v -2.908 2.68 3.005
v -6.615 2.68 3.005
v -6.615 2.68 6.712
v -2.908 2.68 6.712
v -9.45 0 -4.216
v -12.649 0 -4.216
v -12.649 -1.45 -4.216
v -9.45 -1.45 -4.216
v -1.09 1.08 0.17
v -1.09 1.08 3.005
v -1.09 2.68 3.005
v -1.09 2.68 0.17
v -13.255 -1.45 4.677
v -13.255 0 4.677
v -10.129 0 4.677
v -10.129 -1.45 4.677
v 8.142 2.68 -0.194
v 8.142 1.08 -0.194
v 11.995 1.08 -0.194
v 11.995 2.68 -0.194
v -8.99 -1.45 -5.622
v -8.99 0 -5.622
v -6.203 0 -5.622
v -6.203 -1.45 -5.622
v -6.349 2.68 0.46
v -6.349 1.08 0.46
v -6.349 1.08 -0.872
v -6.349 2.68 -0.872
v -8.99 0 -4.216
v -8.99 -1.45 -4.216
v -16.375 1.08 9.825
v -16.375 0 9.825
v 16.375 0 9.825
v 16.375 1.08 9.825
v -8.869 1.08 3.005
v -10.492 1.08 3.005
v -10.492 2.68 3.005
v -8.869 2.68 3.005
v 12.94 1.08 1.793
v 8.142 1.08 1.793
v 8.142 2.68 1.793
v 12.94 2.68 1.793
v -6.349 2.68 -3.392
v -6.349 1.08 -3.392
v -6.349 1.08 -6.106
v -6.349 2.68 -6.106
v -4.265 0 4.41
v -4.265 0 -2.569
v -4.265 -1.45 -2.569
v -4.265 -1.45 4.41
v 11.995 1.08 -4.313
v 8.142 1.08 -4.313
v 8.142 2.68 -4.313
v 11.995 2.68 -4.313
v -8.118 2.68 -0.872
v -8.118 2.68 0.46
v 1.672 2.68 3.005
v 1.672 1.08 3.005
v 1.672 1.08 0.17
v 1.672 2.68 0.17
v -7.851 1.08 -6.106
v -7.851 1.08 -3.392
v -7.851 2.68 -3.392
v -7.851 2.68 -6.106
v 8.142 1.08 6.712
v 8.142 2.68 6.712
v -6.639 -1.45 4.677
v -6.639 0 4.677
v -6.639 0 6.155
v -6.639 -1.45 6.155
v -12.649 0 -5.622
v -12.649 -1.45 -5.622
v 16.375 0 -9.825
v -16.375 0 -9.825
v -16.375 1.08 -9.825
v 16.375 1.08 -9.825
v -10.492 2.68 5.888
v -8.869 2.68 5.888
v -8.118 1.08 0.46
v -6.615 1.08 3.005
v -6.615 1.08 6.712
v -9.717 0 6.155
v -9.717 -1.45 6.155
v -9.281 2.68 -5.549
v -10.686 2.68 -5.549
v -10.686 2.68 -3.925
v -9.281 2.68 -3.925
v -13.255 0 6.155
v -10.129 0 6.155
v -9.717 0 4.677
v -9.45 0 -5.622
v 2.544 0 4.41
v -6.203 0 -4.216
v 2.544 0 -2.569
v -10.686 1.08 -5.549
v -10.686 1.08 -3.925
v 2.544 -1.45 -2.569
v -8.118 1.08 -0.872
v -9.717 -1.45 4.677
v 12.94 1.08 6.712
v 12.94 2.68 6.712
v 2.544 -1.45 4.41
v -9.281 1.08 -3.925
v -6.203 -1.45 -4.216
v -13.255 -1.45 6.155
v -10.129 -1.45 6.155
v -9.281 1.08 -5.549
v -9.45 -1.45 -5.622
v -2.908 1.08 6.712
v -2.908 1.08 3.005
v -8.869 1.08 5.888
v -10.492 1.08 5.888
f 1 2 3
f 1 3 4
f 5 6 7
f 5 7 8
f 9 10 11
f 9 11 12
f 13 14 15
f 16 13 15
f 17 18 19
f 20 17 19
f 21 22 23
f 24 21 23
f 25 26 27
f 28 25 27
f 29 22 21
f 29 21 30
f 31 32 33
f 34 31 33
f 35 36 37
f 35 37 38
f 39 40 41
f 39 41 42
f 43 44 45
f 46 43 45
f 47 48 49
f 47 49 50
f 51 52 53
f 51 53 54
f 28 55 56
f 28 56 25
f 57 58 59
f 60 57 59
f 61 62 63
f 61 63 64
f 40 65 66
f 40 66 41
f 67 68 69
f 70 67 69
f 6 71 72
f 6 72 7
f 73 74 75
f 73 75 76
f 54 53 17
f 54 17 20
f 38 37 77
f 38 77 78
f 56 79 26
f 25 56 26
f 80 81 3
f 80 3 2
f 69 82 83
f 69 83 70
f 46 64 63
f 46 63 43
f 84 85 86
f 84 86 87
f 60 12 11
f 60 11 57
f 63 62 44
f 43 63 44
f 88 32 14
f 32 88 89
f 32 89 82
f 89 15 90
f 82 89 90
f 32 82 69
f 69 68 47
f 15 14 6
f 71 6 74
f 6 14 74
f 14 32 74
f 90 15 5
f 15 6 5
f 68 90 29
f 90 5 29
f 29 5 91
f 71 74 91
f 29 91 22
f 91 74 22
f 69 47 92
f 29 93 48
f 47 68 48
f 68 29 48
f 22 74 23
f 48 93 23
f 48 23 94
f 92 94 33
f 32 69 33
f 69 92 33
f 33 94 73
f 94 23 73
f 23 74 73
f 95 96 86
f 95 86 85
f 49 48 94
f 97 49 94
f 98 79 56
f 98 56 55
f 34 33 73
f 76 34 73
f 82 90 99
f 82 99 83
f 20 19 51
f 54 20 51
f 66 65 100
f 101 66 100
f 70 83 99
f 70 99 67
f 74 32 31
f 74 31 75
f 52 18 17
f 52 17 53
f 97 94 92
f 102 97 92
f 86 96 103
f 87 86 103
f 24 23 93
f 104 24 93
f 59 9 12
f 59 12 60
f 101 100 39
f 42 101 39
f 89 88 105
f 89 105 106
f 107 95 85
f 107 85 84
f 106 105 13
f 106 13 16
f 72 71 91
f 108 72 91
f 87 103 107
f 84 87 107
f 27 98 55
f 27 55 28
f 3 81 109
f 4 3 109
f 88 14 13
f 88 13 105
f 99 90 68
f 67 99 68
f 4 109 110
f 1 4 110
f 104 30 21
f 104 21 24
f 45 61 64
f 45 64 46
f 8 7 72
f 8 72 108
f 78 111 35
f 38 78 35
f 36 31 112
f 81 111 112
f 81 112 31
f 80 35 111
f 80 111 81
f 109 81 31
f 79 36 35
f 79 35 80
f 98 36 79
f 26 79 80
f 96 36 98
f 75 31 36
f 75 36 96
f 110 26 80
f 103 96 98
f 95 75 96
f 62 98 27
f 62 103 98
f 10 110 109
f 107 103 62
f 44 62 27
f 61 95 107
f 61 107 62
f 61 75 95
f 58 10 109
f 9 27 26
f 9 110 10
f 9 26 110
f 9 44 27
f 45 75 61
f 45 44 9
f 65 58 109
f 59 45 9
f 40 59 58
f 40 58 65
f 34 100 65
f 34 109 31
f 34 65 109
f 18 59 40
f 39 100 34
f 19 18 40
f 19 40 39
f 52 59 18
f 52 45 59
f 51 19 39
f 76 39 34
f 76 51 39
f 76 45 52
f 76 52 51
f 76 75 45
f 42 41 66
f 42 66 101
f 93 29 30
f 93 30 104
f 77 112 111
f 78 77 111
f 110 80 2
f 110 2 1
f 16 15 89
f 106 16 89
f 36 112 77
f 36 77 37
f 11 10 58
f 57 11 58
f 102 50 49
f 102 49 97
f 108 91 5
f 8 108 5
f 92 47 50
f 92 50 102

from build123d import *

# Parameters (mm, degrees)
SKETCH1_W           = 32.75
SKETCH1_H           = 19.65
BOSS_EXTRUDE1_DEPTH = 1.08
SKETCH2_W           = 1.405419427
SKETCH2_H           = 1.623501752
SKETCH2_W_2         = 1.502344905
SKETCH2_H_2         = 2.713913376
SKETCH2_W_3         = 1.623501751
SKETCH2_H_3         = 2.883532962
SKETCH2_W_4         = 3.707399523
SKETCH2_H_4         = 3.707399523
SKETCH2_W_5         = 2.762376115
SKETCH2_H_5         = 2.835070223
SKETCH2_W_6         = 4.797811147
SKETCH2_H_6         = 4.918967994
SKETCH2_W_7         = 3.852787739
SKETCH2_H_7         = 4.119332803
SKETCH2_W_8         = 1.768889968
SKETCH2_H_8         = 1.332725318
BOSS_EXTRUDE2_DEPTH = 1.6
SKETCH3_W           = 6.809014809
SKETCH3_H           = 6.978634395
SKETCH3_W_2         = 3.198540765
SKETCH3_H_2         = 1.405419426
SKETCH3_W_3         = 2.786607484
SKETCH3_W_4         = 3.077383918
SKETCH3_H_3         = 1.478113535
SKETCH3_W_5         = 3.125846656
BOSS_EXTRUDE3_DEPTH = 1.45


with BuildPart() as part:
    # Sketch1 → Boss-Extrude1 (new body)
    with BuildSketch(Plane(origin=(0, 0, 0), x_dir=(1, 0, 0), z_dir=(0, 1, 0))):
        Rectangle(SKETCH1_W, SKETCH1_H)
    extrude(amount=BOSS_EXTRUDE1_DEPTH)

    # Sketch2 → Boss-Extrude2 (add)
    with BuildSketch(Plane(origin=(0, 1.08, 0), x_dir=(1, 0, 0), z_dir=(0, 1, 0))):
        with Locations((-9.983324205, 4.737232723)):
            Rectangle(SKETCH2_W, SKETCH2_H)
        with Locations((-7.099791243, 4.749348408)):
            Rectangle(SKETCH2_W_2, SKETCH2_H_2)
        with Locations((-9.680432087, -4.44645629)):
            Rectangle(SKETCH2_W_3, SKETCH2_H_3)
        with Locations((-4.761464093, -4.85838957)):
            Rectangle(SKETCH2_W_4, SKETCH2_H_4)
        with Locations((0.290776433, -1.587154698)):
            Rectangle(SKETCH2_W_5, SKETCH2_H_5)
        with Locations((10.540645702, -4.252605335)):
            Rectangle(SKETCH2_W_6, SKETCH2_H_6)
        with Locations((10.068133998, 2.253517357)):
            Rectangle(SKETCH2_W_7, SKETCH2_H_7)
        with Locations((-7.233063774, 0.20596664)):
            Rectangle(SKETCH2_W_8, SKETCH2_H_8)
    extrude(amount=BOSS_EXTRUDE2_DEPTH)

    # Sketch3 → Boss-Extrude3 (add)
    with BuildSketch(Plane.XZ):
        with Locations((-0.860213615, 0.920792039)):
            Rectangle(SKETCH3_W, SKETCH3_H)
        with Locations((-11.049504459, -4.918967994)):
            Rectangle(SKETCH3_W_2, SKETCH3_H_2)
        with Locations((-7.596534316, -4.918967994)):
            Rectangle(SKETCH3_W_3, SKETCH3_H_2)
        with Locations((-8.178087182, 5.415711068)):
            Rectangle(SKETCH3_W_4, SKETCH3_H_3)
        with Locations((-11.691635749, 5.415711068)):
            Rectangle(SKETCH3_W_5, SKETCH3_H_3)
    extrude(amount=BOSS_EXTRUDE3_DEPTH)


solid = part.part
